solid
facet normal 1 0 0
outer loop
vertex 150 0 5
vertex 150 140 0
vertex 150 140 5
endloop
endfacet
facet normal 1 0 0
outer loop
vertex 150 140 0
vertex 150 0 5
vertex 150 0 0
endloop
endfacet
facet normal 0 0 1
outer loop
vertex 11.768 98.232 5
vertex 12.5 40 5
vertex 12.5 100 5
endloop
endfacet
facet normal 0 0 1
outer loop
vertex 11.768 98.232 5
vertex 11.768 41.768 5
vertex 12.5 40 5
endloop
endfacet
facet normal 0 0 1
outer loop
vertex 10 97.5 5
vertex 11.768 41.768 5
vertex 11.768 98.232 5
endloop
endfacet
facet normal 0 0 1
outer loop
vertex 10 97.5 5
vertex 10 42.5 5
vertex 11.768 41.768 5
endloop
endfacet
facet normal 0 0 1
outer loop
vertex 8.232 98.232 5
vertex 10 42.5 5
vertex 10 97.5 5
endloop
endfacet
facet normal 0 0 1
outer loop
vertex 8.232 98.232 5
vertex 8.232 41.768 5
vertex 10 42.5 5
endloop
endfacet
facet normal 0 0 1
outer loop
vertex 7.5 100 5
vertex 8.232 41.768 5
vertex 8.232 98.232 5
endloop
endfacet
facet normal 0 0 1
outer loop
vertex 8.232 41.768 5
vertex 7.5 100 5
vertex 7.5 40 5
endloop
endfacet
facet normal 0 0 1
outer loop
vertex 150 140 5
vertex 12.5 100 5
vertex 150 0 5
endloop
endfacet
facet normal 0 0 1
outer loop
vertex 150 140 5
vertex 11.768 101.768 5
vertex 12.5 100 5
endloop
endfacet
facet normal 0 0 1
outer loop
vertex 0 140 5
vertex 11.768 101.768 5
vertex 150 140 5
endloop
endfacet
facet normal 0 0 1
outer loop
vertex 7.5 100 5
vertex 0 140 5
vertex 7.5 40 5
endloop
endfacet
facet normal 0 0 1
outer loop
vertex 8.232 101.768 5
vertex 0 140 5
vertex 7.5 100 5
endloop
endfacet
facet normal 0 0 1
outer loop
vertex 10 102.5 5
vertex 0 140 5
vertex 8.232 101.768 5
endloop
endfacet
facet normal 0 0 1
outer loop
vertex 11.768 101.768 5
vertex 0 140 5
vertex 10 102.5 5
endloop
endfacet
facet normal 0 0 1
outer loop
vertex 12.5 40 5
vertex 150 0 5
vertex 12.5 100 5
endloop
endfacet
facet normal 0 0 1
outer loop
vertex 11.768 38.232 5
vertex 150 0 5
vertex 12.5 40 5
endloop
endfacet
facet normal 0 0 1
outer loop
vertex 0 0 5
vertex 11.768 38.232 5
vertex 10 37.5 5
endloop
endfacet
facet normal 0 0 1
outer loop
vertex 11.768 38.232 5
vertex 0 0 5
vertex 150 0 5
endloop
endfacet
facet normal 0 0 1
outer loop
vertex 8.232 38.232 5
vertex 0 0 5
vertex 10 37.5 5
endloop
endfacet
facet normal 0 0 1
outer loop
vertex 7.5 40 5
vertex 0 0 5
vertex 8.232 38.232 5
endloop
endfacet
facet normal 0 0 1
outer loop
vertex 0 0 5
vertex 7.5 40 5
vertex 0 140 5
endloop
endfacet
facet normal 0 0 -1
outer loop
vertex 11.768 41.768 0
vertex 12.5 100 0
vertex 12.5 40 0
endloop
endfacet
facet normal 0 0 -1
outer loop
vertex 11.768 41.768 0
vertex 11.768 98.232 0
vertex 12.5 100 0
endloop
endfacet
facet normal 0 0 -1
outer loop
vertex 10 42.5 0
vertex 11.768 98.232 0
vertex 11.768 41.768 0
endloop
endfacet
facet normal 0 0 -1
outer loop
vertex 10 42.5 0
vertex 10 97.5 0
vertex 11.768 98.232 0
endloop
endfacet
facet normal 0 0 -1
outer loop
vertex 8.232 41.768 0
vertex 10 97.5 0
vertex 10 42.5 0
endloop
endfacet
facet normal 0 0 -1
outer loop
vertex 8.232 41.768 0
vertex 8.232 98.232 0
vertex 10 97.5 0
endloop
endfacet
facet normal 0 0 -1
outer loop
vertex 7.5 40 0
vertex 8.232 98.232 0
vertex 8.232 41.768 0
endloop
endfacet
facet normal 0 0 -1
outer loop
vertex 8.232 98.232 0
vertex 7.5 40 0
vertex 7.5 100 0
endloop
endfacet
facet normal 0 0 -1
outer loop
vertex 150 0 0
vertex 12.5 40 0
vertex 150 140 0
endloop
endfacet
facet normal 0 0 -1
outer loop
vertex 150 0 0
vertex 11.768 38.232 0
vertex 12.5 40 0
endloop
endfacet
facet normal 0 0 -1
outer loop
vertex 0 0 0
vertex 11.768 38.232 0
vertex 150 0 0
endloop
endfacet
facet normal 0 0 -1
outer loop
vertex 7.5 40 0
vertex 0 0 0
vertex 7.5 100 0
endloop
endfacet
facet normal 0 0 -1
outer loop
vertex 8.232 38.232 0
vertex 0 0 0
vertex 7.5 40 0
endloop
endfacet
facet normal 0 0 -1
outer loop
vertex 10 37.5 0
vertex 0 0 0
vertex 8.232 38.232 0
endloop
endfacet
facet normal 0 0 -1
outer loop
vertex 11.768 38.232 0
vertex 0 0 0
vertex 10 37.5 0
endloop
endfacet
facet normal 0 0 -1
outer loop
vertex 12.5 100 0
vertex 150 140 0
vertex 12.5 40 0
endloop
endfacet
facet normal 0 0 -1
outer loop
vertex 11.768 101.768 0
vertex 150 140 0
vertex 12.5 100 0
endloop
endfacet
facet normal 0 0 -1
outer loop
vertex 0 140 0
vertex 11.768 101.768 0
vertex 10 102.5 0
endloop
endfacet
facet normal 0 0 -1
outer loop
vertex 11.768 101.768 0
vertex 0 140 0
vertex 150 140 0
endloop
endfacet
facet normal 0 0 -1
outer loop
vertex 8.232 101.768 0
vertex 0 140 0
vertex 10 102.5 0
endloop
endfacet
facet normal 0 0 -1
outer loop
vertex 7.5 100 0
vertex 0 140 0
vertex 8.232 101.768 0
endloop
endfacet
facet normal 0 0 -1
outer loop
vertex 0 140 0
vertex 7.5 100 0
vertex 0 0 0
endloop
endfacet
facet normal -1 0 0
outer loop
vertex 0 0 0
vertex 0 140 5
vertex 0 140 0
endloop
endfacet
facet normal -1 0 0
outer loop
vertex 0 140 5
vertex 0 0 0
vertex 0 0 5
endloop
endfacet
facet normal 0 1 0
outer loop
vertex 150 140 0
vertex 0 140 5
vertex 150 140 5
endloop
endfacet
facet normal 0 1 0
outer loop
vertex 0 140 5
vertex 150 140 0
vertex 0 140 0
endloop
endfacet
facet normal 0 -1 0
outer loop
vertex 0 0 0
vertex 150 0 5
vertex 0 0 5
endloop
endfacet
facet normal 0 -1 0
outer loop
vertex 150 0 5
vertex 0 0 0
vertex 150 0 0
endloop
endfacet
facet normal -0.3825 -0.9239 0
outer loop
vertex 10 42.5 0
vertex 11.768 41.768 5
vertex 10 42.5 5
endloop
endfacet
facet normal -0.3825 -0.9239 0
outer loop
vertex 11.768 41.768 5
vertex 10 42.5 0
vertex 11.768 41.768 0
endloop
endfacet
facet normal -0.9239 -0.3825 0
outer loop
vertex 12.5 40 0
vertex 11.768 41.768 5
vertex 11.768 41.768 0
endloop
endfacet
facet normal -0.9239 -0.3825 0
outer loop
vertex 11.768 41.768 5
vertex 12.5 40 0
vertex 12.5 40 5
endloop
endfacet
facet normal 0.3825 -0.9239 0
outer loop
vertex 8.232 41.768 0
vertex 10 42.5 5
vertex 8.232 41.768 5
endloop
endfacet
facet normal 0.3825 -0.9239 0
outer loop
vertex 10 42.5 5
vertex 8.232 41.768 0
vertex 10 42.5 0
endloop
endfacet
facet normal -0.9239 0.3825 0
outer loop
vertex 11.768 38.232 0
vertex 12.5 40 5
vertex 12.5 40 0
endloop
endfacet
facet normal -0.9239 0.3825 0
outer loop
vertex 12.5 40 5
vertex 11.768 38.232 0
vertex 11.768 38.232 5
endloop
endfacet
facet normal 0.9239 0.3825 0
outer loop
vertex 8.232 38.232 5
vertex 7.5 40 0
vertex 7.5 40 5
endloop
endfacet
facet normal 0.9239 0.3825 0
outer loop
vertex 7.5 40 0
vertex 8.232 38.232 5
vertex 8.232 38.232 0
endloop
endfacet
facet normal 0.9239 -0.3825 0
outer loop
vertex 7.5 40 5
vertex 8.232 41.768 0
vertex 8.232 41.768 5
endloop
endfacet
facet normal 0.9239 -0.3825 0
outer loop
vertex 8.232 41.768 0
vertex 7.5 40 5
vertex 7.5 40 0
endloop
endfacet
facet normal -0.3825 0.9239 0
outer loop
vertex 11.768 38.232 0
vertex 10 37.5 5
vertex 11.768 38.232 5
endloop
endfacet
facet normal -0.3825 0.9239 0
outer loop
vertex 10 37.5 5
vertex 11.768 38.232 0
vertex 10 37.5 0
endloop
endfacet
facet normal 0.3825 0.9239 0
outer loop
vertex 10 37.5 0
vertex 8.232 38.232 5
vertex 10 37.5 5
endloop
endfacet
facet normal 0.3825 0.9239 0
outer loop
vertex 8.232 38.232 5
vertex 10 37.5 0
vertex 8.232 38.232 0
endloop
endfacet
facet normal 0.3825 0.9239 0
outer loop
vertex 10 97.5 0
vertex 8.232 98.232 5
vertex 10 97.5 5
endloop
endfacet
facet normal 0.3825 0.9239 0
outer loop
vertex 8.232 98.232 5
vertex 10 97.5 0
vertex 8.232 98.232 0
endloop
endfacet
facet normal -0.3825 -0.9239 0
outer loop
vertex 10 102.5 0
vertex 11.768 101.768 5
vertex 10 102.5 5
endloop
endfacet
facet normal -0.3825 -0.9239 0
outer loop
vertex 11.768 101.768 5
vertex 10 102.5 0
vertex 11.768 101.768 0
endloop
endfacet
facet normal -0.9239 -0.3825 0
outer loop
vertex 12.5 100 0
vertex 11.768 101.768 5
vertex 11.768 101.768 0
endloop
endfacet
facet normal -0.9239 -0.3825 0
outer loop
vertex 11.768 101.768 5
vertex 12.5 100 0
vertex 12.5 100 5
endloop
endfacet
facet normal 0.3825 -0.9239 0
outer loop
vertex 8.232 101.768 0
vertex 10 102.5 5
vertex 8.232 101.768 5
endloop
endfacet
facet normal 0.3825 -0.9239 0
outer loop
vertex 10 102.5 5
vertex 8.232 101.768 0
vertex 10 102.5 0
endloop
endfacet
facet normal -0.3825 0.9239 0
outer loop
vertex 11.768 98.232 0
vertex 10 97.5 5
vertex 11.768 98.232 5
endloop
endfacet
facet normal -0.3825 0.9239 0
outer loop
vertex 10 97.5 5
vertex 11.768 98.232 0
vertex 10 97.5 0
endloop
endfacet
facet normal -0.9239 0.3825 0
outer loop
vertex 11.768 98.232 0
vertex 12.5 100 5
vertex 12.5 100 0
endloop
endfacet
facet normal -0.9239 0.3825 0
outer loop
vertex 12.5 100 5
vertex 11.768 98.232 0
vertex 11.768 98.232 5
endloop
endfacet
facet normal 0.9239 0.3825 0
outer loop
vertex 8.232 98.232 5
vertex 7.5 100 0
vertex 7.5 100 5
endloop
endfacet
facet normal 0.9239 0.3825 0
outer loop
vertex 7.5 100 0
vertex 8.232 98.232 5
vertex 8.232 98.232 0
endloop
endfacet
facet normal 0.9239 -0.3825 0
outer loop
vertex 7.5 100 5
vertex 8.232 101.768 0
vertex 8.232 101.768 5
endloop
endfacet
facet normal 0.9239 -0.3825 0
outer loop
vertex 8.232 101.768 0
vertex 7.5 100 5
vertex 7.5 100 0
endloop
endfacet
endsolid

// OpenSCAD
difference()
{
  cube([150,140,5]);
  translate([10,40,-5]) cylinder(h=20,d=5);
  translate([10,100,-5]) cylinder(h=20,d=5);
}
